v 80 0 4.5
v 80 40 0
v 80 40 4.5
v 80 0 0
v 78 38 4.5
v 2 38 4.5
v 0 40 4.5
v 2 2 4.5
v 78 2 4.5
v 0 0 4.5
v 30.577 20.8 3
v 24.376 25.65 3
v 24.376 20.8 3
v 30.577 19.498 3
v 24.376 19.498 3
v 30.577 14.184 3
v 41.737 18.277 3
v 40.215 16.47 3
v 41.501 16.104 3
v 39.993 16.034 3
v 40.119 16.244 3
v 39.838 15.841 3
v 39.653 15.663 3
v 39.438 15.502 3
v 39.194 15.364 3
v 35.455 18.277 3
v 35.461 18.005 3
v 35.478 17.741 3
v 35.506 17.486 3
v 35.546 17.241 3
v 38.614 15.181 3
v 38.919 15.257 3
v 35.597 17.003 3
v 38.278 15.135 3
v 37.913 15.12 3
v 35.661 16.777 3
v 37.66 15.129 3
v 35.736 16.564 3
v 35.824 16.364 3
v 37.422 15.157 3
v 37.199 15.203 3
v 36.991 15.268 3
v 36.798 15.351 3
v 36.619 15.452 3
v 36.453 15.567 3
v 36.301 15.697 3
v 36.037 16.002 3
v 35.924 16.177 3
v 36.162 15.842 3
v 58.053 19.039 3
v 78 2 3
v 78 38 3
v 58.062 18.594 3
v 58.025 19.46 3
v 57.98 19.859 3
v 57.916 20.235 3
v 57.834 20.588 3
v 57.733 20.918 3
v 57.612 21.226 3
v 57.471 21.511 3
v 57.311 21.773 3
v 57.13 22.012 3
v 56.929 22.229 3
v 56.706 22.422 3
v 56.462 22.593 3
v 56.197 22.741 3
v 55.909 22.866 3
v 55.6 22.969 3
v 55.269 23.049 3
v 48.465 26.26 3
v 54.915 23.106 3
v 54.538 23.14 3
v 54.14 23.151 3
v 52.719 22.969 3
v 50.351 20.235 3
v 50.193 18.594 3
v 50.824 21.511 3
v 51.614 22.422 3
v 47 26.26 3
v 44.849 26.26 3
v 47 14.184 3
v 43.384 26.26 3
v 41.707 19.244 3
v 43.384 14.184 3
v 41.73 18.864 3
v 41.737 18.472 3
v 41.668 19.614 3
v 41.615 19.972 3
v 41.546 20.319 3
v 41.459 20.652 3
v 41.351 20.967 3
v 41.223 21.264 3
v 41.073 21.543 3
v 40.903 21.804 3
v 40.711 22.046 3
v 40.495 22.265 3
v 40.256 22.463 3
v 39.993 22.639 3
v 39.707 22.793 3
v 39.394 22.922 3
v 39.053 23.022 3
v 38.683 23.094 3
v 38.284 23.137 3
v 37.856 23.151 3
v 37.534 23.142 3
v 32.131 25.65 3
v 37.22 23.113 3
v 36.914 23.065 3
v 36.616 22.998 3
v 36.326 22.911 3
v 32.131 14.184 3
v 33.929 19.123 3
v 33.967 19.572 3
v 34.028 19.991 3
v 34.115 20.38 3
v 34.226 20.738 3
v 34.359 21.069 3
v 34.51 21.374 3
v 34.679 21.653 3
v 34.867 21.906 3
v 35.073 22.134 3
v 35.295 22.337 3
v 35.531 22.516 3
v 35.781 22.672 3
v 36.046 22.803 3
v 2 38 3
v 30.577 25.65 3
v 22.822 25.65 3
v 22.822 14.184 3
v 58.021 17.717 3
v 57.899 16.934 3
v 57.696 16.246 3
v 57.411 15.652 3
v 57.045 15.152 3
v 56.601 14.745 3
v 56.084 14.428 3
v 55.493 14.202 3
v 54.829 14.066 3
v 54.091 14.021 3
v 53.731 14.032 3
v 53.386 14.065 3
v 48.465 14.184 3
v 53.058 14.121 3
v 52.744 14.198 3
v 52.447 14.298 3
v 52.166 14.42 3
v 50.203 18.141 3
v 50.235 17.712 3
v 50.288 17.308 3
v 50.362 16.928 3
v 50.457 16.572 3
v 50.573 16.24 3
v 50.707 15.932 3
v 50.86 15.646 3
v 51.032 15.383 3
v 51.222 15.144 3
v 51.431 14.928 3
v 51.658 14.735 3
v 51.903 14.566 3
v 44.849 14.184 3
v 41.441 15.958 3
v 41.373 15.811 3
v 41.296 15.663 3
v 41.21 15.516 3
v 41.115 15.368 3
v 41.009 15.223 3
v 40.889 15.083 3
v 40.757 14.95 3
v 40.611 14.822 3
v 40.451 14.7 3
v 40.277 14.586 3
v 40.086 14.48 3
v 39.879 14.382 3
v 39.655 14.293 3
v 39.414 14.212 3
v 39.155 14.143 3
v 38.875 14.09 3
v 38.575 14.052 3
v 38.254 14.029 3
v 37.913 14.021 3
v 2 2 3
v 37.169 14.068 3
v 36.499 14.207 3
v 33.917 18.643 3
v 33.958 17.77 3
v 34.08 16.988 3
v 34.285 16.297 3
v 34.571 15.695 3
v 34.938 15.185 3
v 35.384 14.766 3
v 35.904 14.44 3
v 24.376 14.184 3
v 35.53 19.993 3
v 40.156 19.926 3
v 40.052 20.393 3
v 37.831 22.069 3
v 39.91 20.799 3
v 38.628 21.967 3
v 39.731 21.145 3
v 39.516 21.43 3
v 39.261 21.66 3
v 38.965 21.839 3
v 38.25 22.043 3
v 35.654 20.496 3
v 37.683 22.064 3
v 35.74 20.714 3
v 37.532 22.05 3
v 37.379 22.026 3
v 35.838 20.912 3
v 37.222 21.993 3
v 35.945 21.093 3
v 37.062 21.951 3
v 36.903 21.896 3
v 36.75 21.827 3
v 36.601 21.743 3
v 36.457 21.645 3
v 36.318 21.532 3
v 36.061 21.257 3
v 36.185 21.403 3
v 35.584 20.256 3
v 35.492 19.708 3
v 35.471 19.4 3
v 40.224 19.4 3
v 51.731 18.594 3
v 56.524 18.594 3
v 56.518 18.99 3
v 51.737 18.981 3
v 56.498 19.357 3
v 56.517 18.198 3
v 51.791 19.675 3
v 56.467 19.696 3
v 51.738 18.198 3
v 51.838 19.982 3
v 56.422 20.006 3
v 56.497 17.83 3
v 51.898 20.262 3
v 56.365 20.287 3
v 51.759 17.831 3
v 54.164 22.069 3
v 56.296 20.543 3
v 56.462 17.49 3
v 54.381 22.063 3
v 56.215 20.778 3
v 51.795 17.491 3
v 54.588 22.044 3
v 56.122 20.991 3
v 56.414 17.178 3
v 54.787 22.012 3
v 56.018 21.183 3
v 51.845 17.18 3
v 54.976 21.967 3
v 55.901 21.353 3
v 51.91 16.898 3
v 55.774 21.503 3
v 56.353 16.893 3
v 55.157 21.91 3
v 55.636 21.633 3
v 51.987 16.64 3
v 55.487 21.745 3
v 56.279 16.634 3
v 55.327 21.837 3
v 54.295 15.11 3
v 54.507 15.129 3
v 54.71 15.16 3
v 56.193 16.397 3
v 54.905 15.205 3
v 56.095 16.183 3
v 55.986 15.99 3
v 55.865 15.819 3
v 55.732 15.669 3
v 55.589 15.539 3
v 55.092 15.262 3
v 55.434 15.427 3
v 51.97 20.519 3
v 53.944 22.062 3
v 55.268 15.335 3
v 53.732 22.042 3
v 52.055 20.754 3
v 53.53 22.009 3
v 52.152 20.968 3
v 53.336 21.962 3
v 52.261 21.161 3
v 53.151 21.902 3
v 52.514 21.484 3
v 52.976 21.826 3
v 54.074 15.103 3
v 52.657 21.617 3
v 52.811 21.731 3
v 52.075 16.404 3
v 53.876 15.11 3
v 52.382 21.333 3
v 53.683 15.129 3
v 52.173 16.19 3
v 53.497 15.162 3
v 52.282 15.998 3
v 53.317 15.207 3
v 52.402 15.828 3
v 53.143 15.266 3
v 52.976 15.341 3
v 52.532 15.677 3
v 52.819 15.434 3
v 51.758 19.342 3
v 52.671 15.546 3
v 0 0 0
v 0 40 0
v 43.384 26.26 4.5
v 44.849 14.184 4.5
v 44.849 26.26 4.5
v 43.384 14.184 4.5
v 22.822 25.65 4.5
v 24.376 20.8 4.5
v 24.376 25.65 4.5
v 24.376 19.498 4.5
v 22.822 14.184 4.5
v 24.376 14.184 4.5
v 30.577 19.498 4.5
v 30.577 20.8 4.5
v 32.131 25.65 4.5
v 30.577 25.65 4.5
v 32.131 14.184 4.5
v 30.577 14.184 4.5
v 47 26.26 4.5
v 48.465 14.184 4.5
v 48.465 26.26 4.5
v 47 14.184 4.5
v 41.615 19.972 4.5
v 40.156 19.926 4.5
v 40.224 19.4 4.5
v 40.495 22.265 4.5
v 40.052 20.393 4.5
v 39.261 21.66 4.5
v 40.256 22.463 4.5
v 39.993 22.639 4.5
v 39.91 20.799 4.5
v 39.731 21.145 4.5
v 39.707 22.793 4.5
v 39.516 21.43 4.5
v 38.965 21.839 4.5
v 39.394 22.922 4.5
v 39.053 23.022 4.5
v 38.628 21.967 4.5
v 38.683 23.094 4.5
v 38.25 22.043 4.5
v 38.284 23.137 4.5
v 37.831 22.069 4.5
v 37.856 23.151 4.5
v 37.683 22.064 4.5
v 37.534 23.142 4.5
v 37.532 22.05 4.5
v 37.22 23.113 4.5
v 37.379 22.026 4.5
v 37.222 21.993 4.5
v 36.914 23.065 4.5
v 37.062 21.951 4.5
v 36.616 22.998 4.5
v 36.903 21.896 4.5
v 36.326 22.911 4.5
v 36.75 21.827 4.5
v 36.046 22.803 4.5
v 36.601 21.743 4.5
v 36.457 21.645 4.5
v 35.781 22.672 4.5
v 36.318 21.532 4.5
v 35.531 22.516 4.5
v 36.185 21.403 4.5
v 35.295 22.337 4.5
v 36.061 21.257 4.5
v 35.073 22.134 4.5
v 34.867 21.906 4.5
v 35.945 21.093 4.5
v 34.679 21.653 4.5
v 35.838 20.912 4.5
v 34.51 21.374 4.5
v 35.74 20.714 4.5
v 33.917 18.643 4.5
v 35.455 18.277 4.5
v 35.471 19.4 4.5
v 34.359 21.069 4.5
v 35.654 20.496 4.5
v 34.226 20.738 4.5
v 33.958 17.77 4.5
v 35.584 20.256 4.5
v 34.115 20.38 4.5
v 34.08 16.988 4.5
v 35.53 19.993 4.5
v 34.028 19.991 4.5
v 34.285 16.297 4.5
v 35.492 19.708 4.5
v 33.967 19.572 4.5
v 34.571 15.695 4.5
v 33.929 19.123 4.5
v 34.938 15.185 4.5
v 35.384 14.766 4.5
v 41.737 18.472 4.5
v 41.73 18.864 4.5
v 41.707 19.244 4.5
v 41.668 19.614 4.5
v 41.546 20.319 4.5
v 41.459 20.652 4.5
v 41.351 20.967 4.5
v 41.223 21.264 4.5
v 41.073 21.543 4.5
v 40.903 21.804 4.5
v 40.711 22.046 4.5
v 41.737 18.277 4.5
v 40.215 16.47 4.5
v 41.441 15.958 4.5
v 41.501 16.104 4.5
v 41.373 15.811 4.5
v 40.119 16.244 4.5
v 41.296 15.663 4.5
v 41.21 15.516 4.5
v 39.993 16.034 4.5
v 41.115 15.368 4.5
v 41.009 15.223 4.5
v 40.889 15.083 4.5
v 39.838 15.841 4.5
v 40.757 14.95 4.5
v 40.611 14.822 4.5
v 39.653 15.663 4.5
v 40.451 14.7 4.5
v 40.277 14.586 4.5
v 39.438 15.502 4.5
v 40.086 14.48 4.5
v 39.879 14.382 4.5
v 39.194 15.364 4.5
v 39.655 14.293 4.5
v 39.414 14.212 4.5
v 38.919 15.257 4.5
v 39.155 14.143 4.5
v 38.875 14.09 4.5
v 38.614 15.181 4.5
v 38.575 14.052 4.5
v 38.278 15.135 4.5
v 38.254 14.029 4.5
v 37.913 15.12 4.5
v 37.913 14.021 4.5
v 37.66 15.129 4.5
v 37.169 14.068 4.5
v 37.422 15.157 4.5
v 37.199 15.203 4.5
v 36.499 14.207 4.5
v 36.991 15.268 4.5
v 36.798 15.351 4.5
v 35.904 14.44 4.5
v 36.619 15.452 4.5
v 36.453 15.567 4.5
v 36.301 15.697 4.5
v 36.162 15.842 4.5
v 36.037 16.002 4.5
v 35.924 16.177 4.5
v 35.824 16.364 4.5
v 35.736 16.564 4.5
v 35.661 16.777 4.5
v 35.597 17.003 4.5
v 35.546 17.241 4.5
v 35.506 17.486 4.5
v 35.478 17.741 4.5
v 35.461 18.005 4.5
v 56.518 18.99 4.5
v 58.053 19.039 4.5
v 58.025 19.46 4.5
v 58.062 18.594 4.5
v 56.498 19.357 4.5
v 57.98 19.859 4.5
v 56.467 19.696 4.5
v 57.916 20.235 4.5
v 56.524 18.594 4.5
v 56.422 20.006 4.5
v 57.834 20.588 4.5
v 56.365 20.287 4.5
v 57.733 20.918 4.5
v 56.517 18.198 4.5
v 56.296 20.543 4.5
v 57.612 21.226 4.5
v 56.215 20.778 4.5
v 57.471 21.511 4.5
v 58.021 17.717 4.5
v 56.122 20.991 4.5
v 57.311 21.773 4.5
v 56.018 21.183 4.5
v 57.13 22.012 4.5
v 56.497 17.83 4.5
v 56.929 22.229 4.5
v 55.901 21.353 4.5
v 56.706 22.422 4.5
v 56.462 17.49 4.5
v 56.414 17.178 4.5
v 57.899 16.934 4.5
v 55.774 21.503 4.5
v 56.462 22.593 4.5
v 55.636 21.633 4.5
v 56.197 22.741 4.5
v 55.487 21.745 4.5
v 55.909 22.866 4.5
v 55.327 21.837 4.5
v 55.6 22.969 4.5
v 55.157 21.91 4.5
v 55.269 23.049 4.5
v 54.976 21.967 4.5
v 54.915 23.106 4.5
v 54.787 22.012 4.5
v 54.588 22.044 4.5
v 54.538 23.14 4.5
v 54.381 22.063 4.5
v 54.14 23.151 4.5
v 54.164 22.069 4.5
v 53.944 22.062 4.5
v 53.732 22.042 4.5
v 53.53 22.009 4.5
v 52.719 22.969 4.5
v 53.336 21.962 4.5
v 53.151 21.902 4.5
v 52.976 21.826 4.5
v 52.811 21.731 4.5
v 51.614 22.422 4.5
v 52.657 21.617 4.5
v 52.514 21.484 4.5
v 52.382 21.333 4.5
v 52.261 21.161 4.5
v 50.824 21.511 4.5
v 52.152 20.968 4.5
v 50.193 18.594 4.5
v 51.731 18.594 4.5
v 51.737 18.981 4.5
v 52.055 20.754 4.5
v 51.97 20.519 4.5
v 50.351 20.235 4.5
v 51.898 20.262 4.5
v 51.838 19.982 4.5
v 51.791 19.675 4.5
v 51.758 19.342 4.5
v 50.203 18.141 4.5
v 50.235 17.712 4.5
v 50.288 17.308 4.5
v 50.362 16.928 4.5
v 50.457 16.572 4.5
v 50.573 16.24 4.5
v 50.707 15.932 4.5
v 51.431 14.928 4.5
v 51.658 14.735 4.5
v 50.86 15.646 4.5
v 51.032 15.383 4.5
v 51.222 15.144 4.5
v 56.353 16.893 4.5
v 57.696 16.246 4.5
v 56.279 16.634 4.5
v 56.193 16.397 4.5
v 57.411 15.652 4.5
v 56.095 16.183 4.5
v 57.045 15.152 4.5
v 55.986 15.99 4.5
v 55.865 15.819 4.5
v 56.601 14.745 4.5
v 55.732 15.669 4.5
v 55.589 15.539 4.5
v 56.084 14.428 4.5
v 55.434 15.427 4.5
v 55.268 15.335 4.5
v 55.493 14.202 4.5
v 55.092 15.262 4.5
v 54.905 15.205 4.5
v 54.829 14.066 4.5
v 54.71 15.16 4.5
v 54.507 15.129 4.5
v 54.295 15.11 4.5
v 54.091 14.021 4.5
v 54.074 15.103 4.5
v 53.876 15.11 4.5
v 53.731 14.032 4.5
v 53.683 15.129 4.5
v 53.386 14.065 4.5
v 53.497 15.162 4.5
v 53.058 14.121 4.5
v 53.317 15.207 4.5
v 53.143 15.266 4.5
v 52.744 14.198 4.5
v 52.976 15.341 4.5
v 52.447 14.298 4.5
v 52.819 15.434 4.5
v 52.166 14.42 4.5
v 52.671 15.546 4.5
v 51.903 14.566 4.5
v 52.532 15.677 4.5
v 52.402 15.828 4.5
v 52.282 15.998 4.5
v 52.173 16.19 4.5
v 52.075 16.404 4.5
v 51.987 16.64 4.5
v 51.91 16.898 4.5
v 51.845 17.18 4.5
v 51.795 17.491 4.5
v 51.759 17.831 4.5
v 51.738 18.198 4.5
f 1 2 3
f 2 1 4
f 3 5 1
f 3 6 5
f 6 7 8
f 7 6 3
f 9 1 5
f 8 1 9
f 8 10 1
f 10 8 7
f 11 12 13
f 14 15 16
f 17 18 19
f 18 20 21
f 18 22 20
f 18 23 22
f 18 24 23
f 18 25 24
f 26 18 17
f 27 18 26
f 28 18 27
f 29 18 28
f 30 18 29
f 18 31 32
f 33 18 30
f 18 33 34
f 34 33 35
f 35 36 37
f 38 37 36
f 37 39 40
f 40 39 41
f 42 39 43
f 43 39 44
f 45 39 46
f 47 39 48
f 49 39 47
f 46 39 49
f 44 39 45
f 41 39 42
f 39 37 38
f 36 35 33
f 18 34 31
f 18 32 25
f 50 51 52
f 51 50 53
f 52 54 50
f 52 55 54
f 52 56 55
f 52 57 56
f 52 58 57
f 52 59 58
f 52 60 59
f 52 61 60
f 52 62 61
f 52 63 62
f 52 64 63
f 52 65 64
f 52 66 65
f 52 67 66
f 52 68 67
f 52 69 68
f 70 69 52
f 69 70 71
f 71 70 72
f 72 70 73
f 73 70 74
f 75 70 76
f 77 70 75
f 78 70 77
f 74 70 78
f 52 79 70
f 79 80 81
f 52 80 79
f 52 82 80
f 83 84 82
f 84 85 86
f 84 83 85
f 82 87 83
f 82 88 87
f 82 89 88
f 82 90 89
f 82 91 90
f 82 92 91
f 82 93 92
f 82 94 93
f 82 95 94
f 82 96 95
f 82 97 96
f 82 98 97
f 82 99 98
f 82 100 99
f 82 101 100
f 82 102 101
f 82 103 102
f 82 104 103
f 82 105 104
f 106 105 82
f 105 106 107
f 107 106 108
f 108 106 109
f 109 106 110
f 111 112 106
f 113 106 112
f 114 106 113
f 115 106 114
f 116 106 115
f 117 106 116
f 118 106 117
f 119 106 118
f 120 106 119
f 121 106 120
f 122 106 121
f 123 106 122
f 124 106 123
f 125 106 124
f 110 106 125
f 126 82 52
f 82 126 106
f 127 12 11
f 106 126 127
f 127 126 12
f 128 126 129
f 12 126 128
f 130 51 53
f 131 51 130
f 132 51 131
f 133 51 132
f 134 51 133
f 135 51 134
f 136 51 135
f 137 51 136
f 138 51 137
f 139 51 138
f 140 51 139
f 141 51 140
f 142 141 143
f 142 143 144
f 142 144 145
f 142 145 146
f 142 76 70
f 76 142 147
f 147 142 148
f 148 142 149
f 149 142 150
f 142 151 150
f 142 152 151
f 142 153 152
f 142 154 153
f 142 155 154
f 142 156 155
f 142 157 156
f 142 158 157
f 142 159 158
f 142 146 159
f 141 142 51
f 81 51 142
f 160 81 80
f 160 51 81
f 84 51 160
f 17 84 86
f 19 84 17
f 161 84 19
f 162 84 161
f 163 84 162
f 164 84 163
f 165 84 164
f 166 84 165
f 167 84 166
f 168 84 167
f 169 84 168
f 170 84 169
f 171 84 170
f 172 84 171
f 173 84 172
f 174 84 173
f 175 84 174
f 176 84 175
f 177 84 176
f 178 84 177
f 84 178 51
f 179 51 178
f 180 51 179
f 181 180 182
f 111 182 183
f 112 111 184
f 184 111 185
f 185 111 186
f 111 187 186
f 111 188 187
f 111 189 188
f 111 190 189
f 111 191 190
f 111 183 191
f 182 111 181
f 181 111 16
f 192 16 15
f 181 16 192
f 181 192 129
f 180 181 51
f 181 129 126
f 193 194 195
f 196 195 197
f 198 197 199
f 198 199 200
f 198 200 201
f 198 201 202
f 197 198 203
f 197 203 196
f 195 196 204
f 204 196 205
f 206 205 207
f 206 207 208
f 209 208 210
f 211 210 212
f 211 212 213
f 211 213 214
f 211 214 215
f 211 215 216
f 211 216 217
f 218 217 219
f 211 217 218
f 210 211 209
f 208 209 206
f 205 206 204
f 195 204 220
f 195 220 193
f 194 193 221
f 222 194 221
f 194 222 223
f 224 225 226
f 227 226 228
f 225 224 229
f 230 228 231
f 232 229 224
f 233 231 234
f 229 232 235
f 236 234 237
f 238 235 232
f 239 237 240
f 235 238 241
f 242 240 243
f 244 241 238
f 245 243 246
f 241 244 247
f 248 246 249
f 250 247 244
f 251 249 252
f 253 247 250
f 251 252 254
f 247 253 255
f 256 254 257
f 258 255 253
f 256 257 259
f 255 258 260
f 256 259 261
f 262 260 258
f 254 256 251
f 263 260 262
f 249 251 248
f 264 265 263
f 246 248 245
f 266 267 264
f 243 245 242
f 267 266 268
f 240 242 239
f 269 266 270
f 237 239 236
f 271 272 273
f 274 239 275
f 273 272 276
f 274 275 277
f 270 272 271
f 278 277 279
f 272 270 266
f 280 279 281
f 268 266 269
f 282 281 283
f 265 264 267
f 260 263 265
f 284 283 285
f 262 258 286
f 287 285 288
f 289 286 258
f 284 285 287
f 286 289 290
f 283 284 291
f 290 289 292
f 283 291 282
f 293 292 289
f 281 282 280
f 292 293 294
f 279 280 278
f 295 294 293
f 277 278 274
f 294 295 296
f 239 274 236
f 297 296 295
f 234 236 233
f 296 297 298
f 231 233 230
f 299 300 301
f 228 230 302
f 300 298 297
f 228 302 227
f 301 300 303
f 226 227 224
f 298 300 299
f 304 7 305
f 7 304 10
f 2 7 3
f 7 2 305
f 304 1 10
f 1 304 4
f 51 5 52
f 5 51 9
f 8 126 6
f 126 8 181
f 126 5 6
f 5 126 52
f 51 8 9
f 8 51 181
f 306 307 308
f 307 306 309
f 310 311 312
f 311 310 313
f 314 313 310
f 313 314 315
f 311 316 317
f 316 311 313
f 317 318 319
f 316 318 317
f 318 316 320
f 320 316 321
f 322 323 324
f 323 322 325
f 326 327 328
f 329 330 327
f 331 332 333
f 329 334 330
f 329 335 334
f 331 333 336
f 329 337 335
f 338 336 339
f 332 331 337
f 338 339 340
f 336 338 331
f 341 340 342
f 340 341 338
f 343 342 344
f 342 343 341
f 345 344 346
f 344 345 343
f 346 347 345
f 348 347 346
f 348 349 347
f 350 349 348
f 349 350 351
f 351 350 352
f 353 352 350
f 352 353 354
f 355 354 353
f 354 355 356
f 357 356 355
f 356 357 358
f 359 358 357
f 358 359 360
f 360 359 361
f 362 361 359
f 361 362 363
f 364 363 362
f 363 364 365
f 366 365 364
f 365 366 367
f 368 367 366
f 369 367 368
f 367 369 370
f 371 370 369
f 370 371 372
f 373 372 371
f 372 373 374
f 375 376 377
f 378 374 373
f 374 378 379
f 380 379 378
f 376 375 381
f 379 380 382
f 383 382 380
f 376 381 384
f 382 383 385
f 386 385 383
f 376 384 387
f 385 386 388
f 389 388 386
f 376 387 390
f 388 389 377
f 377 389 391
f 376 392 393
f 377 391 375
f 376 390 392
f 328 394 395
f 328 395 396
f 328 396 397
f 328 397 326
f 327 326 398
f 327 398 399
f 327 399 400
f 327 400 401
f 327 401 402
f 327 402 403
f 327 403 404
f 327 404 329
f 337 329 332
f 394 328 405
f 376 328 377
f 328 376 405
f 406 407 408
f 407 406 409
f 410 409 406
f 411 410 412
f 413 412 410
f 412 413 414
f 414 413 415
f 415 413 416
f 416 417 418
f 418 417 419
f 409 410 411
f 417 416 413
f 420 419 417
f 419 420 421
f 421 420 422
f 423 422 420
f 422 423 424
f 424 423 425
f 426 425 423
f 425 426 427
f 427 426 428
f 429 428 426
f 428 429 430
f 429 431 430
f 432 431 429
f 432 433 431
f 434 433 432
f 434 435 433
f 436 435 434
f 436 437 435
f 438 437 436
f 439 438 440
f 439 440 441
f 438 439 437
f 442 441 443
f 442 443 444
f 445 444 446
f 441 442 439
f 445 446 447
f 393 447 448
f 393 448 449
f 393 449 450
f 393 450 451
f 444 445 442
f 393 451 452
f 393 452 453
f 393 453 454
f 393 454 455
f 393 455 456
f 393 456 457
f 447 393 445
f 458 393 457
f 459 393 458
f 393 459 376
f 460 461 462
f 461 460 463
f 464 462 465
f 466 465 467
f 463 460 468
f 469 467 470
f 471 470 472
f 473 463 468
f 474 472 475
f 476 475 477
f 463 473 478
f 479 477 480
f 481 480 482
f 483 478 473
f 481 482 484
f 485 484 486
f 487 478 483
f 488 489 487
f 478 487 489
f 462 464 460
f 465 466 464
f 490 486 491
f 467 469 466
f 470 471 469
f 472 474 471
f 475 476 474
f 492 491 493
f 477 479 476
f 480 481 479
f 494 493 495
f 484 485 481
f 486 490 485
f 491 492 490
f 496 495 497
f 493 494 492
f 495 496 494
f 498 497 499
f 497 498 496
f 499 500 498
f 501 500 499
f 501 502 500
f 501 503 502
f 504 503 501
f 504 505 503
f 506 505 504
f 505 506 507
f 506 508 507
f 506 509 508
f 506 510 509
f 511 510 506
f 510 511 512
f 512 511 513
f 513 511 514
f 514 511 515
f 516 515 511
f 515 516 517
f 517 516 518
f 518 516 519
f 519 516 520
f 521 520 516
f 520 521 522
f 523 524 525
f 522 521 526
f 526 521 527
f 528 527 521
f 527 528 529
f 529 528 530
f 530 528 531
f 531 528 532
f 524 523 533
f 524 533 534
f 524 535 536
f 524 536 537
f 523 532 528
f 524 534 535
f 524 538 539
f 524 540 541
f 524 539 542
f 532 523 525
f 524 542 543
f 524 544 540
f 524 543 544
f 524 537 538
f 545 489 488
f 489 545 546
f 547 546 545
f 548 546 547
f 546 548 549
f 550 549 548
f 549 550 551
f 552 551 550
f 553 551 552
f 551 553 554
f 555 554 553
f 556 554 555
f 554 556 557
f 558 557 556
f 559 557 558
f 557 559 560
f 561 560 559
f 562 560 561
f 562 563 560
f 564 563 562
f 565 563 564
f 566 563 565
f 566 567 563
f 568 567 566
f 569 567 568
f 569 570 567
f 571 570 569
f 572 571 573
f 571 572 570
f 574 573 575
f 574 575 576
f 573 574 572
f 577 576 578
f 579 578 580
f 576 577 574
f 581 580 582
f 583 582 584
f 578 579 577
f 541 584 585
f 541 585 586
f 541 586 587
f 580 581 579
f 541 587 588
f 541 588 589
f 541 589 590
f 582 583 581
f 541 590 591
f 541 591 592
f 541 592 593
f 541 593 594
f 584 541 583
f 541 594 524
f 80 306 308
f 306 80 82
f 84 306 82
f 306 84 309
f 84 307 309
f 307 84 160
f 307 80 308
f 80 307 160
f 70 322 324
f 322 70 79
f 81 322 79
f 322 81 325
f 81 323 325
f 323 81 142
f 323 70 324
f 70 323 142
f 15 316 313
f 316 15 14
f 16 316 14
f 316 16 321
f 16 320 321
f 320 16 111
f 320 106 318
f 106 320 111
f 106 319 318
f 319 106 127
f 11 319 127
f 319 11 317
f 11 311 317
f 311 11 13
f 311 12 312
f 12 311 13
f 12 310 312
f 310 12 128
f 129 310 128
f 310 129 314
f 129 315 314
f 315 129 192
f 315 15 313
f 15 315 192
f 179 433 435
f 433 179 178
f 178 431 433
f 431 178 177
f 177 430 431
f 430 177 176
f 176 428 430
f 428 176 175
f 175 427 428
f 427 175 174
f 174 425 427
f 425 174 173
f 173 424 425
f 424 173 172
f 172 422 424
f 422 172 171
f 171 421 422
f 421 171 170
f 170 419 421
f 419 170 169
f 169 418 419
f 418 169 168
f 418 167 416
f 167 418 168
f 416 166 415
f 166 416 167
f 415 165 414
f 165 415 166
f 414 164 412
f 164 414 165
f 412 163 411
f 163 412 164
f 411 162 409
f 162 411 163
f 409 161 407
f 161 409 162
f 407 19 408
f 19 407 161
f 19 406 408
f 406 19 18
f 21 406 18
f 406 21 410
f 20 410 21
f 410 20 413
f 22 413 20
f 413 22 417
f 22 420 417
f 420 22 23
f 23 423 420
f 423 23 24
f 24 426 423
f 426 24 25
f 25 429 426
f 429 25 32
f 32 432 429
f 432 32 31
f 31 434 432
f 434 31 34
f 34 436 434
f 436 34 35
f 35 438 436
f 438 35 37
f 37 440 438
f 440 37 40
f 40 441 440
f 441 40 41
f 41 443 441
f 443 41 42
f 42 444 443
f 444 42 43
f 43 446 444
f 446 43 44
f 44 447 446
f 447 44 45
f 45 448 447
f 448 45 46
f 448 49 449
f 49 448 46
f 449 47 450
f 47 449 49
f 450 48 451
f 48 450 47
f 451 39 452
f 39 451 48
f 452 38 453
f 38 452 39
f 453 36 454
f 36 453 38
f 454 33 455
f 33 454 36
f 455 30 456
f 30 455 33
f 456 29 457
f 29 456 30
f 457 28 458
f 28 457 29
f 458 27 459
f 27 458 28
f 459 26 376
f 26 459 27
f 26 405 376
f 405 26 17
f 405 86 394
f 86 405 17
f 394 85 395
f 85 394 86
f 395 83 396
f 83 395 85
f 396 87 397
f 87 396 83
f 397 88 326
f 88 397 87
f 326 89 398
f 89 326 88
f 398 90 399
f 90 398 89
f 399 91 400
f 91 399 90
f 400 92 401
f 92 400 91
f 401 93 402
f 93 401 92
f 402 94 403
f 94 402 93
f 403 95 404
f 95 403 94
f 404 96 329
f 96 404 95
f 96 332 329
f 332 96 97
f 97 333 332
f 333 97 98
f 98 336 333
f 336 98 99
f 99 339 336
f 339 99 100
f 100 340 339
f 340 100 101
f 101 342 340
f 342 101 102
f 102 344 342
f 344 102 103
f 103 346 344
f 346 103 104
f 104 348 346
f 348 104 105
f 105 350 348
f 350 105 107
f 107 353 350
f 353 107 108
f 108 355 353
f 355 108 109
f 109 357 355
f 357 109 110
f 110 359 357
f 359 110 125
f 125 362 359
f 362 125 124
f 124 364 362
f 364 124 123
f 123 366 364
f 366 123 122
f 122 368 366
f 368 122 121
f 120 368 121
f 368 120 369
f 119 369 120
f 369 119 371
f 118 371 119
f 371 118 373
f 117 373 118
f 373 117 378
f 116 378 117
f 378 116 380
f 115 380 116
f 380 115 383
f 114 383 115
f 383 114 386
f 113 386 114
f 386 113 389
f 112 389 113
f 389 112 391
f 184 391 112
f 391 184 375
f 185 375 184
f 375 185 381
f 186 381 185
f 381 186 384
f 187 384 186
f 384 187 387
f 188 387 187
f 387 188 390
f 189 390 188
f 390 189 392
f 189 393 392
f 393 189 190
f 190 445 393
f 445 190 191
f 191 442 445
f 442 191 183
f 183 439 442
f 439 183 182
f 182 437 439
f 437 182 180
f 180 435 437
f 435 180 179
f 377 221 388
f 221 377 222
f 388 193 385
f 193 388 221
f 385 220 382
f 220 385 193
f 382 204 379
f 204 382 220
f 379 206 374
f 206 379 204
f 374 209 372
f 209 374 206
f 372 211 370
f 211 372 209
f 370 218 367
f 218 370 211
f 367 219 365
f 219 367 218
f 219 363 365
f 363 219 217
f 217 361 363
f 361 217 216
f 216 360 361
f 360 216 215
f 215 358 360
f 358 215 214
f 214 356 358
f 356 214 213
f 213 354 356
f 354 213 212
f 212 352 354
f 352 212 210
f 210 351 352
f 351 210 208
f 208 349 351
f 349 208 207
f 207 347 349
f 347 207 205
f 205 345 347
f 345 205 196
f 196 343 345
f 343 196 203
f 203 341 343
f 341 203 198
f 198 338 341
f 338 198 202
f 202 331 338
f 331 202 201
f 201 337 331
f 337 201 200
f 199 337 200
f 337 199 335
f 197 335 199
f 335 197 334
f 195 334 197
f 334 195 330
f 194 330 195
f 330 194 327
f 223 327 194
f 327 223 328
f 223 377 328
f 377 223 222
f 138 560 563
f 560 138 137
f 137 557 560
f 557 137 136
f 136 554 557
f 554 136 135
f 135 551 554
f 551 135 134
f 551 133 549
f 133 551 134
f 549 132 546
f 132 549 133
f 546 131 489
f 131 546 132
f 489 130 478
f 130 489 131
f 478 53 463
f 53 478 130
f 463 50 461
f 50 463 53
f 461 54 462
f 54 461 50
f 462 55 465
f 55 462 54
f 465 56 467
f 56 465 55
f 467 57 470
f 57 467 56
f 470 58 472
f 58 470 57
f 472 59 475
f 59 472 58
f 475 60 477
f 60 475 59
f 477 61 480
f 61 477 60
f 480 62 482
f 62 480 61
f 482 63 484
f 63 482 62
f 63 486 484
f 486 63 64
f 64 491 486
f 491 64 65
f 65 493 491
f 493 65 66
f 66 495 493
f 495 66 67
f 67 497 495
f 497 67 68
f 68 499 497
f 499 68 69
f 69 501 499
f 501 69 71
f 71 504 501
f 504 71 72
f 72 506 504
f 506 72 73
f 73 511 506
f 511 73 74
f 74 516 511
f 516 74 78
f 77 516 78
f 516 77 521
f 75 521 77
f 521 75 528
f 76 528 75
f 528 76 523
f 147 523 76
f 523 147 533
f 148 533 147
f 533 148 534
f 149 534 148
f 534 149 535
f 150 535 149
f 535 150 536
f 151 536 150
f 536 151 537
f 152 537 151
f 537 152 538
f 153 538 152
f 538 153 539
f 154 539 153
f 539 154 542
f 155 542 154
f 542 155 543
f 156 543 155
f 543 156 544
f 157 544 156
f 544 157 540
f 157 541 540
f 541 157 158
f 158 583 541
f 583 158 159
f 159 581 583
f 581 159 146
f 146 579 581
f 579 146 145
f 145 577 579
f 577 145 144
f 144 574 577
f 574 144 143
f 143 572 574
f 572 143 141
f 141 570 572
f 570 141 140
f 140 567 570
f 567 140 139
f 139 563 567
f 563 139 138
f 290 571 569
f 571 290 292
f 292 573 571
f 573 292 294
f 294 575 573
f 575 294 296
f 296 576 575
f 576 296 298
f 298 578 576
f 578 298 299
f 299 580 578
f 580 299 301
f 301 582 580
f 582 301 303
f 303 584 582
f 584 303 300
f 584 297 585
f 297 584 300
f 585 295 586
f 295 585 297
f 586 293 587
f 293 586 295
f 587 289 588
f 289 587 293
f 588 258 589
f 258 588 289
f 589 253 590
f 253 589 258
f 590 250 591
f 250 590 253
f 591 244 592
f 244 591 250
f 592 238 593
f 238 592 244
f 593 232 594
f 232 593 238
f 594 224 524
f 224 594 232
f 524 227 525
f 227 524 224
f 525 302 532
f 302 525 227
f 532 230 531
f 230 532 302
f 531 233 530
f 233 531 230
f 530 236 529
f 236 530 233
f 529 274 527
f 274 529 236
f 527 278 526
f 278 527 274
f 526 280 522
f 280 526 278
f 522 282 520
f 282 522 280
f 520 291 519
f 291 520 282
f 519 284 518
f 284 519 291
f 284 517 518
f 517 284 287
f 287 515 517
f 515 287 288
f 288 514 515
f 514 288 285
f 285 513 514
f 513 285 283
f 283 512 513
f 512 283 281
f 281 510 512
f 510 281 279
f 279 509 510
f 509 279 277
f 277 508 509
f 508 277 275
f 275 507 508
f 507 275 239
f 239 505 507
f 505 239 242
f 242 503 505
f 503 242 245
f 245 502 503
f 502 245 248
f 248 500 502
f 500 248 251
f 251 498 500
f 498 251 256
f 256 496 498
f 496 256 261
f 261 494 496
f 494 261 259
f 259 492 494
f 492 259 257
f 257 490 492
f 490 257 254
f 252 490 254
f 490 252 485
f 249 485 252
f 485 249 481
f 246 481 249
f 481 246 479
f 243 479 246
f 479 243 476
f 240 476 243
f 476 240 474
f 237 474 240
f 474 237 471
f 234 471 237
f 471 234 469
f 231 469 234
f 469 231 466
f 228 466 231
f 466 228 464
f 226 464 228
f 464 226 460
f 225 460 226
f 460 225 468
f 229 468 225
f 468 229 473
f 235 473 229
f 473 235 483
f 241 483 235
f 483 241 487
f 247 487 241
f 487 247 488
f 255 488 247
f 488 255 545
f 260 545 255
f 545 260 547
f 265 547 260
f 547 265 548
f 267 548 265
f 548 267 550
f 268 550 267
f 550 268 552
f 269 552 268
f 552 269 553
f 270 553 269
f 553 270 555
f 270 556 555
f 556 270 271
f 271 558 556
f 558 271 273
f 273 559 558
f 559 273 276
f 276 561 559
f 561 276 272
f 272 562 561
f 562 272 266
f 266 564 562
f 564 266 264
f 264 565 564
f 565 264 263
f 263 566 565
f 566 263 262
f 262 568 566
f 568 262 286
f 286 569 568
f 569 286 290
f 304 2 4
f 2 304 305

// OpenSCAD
// Yantra4D wrapper — Sign with Border
// Larger plate with decorative border frame and text

message = "Hello";
font_size = 12;
text_depth = 1.5;
base_width = 80;
base_height = 40;
base_thickness = 3;
raised = true;
border_width = 2;
fn = 0;
render_mode = 0;

$fn = fn > 0 ? fn : 32;

// Font and clip -- see plaque.scad for the full rationale. In short: neither
// kernel named a font, so each resolved its own default face and the two set
// the same string at the same nominal size to different widths (1.656 mm of
// bounding box at name_plaque, 2.80% of volume at door_sign). Name the font on
// both sides, and clip raised text to the plate so the bounding box can never
// grow with the string.
FONT = "Liberation Sans";


module sign_base() {
    cube([base_width, base_height, base_thickness]);
}

module border_frame() {
    // Raised border around the edge
    difference() {
        cube([base_width, base_height, text_depth]);
        translate([border_width, border_width, -0.1])
            cube([base_width - border_width * 2,
                  base_height - border_width * 2,
                  text_depth + 0.2]);
    }
}

if (raised) {
    union() {
        sign_base();
        // Border frame on top
        translate([0, 0, base_thickness])
            border_frame();
        // Raised text, clipped to the INNER window rather than the outer
        // plate, so it can neither overhang the sign nor fuse into the frame.
        intersection() {
            translate([base_width / 2, base_height / 2, base_thickness])
                linear_extrude(text_depth)
                    text(message, size = font_size, font = FONT,
                         halign = "center", valign = "center");
            translate([border_width, border_width, base_thickness])
                cube([base_width - border_width * 2,
                      base_height - border_width * 2,
                      text_depth]);
        }
    }
} else {
    difference() {
        union() {
            sign_base();
            // Border frame on top
            translate([0, 0, base_thickness])
                border_frame();
        }
        // Inset text
        translate([base_width / 2, base_height / 2, base_thickness - text_depth])
            linear_extrude(text_depth + 0.1)
                text(message, size = font_size, font = FONT,
                     halign = "center", valign = "center");
    }
}
